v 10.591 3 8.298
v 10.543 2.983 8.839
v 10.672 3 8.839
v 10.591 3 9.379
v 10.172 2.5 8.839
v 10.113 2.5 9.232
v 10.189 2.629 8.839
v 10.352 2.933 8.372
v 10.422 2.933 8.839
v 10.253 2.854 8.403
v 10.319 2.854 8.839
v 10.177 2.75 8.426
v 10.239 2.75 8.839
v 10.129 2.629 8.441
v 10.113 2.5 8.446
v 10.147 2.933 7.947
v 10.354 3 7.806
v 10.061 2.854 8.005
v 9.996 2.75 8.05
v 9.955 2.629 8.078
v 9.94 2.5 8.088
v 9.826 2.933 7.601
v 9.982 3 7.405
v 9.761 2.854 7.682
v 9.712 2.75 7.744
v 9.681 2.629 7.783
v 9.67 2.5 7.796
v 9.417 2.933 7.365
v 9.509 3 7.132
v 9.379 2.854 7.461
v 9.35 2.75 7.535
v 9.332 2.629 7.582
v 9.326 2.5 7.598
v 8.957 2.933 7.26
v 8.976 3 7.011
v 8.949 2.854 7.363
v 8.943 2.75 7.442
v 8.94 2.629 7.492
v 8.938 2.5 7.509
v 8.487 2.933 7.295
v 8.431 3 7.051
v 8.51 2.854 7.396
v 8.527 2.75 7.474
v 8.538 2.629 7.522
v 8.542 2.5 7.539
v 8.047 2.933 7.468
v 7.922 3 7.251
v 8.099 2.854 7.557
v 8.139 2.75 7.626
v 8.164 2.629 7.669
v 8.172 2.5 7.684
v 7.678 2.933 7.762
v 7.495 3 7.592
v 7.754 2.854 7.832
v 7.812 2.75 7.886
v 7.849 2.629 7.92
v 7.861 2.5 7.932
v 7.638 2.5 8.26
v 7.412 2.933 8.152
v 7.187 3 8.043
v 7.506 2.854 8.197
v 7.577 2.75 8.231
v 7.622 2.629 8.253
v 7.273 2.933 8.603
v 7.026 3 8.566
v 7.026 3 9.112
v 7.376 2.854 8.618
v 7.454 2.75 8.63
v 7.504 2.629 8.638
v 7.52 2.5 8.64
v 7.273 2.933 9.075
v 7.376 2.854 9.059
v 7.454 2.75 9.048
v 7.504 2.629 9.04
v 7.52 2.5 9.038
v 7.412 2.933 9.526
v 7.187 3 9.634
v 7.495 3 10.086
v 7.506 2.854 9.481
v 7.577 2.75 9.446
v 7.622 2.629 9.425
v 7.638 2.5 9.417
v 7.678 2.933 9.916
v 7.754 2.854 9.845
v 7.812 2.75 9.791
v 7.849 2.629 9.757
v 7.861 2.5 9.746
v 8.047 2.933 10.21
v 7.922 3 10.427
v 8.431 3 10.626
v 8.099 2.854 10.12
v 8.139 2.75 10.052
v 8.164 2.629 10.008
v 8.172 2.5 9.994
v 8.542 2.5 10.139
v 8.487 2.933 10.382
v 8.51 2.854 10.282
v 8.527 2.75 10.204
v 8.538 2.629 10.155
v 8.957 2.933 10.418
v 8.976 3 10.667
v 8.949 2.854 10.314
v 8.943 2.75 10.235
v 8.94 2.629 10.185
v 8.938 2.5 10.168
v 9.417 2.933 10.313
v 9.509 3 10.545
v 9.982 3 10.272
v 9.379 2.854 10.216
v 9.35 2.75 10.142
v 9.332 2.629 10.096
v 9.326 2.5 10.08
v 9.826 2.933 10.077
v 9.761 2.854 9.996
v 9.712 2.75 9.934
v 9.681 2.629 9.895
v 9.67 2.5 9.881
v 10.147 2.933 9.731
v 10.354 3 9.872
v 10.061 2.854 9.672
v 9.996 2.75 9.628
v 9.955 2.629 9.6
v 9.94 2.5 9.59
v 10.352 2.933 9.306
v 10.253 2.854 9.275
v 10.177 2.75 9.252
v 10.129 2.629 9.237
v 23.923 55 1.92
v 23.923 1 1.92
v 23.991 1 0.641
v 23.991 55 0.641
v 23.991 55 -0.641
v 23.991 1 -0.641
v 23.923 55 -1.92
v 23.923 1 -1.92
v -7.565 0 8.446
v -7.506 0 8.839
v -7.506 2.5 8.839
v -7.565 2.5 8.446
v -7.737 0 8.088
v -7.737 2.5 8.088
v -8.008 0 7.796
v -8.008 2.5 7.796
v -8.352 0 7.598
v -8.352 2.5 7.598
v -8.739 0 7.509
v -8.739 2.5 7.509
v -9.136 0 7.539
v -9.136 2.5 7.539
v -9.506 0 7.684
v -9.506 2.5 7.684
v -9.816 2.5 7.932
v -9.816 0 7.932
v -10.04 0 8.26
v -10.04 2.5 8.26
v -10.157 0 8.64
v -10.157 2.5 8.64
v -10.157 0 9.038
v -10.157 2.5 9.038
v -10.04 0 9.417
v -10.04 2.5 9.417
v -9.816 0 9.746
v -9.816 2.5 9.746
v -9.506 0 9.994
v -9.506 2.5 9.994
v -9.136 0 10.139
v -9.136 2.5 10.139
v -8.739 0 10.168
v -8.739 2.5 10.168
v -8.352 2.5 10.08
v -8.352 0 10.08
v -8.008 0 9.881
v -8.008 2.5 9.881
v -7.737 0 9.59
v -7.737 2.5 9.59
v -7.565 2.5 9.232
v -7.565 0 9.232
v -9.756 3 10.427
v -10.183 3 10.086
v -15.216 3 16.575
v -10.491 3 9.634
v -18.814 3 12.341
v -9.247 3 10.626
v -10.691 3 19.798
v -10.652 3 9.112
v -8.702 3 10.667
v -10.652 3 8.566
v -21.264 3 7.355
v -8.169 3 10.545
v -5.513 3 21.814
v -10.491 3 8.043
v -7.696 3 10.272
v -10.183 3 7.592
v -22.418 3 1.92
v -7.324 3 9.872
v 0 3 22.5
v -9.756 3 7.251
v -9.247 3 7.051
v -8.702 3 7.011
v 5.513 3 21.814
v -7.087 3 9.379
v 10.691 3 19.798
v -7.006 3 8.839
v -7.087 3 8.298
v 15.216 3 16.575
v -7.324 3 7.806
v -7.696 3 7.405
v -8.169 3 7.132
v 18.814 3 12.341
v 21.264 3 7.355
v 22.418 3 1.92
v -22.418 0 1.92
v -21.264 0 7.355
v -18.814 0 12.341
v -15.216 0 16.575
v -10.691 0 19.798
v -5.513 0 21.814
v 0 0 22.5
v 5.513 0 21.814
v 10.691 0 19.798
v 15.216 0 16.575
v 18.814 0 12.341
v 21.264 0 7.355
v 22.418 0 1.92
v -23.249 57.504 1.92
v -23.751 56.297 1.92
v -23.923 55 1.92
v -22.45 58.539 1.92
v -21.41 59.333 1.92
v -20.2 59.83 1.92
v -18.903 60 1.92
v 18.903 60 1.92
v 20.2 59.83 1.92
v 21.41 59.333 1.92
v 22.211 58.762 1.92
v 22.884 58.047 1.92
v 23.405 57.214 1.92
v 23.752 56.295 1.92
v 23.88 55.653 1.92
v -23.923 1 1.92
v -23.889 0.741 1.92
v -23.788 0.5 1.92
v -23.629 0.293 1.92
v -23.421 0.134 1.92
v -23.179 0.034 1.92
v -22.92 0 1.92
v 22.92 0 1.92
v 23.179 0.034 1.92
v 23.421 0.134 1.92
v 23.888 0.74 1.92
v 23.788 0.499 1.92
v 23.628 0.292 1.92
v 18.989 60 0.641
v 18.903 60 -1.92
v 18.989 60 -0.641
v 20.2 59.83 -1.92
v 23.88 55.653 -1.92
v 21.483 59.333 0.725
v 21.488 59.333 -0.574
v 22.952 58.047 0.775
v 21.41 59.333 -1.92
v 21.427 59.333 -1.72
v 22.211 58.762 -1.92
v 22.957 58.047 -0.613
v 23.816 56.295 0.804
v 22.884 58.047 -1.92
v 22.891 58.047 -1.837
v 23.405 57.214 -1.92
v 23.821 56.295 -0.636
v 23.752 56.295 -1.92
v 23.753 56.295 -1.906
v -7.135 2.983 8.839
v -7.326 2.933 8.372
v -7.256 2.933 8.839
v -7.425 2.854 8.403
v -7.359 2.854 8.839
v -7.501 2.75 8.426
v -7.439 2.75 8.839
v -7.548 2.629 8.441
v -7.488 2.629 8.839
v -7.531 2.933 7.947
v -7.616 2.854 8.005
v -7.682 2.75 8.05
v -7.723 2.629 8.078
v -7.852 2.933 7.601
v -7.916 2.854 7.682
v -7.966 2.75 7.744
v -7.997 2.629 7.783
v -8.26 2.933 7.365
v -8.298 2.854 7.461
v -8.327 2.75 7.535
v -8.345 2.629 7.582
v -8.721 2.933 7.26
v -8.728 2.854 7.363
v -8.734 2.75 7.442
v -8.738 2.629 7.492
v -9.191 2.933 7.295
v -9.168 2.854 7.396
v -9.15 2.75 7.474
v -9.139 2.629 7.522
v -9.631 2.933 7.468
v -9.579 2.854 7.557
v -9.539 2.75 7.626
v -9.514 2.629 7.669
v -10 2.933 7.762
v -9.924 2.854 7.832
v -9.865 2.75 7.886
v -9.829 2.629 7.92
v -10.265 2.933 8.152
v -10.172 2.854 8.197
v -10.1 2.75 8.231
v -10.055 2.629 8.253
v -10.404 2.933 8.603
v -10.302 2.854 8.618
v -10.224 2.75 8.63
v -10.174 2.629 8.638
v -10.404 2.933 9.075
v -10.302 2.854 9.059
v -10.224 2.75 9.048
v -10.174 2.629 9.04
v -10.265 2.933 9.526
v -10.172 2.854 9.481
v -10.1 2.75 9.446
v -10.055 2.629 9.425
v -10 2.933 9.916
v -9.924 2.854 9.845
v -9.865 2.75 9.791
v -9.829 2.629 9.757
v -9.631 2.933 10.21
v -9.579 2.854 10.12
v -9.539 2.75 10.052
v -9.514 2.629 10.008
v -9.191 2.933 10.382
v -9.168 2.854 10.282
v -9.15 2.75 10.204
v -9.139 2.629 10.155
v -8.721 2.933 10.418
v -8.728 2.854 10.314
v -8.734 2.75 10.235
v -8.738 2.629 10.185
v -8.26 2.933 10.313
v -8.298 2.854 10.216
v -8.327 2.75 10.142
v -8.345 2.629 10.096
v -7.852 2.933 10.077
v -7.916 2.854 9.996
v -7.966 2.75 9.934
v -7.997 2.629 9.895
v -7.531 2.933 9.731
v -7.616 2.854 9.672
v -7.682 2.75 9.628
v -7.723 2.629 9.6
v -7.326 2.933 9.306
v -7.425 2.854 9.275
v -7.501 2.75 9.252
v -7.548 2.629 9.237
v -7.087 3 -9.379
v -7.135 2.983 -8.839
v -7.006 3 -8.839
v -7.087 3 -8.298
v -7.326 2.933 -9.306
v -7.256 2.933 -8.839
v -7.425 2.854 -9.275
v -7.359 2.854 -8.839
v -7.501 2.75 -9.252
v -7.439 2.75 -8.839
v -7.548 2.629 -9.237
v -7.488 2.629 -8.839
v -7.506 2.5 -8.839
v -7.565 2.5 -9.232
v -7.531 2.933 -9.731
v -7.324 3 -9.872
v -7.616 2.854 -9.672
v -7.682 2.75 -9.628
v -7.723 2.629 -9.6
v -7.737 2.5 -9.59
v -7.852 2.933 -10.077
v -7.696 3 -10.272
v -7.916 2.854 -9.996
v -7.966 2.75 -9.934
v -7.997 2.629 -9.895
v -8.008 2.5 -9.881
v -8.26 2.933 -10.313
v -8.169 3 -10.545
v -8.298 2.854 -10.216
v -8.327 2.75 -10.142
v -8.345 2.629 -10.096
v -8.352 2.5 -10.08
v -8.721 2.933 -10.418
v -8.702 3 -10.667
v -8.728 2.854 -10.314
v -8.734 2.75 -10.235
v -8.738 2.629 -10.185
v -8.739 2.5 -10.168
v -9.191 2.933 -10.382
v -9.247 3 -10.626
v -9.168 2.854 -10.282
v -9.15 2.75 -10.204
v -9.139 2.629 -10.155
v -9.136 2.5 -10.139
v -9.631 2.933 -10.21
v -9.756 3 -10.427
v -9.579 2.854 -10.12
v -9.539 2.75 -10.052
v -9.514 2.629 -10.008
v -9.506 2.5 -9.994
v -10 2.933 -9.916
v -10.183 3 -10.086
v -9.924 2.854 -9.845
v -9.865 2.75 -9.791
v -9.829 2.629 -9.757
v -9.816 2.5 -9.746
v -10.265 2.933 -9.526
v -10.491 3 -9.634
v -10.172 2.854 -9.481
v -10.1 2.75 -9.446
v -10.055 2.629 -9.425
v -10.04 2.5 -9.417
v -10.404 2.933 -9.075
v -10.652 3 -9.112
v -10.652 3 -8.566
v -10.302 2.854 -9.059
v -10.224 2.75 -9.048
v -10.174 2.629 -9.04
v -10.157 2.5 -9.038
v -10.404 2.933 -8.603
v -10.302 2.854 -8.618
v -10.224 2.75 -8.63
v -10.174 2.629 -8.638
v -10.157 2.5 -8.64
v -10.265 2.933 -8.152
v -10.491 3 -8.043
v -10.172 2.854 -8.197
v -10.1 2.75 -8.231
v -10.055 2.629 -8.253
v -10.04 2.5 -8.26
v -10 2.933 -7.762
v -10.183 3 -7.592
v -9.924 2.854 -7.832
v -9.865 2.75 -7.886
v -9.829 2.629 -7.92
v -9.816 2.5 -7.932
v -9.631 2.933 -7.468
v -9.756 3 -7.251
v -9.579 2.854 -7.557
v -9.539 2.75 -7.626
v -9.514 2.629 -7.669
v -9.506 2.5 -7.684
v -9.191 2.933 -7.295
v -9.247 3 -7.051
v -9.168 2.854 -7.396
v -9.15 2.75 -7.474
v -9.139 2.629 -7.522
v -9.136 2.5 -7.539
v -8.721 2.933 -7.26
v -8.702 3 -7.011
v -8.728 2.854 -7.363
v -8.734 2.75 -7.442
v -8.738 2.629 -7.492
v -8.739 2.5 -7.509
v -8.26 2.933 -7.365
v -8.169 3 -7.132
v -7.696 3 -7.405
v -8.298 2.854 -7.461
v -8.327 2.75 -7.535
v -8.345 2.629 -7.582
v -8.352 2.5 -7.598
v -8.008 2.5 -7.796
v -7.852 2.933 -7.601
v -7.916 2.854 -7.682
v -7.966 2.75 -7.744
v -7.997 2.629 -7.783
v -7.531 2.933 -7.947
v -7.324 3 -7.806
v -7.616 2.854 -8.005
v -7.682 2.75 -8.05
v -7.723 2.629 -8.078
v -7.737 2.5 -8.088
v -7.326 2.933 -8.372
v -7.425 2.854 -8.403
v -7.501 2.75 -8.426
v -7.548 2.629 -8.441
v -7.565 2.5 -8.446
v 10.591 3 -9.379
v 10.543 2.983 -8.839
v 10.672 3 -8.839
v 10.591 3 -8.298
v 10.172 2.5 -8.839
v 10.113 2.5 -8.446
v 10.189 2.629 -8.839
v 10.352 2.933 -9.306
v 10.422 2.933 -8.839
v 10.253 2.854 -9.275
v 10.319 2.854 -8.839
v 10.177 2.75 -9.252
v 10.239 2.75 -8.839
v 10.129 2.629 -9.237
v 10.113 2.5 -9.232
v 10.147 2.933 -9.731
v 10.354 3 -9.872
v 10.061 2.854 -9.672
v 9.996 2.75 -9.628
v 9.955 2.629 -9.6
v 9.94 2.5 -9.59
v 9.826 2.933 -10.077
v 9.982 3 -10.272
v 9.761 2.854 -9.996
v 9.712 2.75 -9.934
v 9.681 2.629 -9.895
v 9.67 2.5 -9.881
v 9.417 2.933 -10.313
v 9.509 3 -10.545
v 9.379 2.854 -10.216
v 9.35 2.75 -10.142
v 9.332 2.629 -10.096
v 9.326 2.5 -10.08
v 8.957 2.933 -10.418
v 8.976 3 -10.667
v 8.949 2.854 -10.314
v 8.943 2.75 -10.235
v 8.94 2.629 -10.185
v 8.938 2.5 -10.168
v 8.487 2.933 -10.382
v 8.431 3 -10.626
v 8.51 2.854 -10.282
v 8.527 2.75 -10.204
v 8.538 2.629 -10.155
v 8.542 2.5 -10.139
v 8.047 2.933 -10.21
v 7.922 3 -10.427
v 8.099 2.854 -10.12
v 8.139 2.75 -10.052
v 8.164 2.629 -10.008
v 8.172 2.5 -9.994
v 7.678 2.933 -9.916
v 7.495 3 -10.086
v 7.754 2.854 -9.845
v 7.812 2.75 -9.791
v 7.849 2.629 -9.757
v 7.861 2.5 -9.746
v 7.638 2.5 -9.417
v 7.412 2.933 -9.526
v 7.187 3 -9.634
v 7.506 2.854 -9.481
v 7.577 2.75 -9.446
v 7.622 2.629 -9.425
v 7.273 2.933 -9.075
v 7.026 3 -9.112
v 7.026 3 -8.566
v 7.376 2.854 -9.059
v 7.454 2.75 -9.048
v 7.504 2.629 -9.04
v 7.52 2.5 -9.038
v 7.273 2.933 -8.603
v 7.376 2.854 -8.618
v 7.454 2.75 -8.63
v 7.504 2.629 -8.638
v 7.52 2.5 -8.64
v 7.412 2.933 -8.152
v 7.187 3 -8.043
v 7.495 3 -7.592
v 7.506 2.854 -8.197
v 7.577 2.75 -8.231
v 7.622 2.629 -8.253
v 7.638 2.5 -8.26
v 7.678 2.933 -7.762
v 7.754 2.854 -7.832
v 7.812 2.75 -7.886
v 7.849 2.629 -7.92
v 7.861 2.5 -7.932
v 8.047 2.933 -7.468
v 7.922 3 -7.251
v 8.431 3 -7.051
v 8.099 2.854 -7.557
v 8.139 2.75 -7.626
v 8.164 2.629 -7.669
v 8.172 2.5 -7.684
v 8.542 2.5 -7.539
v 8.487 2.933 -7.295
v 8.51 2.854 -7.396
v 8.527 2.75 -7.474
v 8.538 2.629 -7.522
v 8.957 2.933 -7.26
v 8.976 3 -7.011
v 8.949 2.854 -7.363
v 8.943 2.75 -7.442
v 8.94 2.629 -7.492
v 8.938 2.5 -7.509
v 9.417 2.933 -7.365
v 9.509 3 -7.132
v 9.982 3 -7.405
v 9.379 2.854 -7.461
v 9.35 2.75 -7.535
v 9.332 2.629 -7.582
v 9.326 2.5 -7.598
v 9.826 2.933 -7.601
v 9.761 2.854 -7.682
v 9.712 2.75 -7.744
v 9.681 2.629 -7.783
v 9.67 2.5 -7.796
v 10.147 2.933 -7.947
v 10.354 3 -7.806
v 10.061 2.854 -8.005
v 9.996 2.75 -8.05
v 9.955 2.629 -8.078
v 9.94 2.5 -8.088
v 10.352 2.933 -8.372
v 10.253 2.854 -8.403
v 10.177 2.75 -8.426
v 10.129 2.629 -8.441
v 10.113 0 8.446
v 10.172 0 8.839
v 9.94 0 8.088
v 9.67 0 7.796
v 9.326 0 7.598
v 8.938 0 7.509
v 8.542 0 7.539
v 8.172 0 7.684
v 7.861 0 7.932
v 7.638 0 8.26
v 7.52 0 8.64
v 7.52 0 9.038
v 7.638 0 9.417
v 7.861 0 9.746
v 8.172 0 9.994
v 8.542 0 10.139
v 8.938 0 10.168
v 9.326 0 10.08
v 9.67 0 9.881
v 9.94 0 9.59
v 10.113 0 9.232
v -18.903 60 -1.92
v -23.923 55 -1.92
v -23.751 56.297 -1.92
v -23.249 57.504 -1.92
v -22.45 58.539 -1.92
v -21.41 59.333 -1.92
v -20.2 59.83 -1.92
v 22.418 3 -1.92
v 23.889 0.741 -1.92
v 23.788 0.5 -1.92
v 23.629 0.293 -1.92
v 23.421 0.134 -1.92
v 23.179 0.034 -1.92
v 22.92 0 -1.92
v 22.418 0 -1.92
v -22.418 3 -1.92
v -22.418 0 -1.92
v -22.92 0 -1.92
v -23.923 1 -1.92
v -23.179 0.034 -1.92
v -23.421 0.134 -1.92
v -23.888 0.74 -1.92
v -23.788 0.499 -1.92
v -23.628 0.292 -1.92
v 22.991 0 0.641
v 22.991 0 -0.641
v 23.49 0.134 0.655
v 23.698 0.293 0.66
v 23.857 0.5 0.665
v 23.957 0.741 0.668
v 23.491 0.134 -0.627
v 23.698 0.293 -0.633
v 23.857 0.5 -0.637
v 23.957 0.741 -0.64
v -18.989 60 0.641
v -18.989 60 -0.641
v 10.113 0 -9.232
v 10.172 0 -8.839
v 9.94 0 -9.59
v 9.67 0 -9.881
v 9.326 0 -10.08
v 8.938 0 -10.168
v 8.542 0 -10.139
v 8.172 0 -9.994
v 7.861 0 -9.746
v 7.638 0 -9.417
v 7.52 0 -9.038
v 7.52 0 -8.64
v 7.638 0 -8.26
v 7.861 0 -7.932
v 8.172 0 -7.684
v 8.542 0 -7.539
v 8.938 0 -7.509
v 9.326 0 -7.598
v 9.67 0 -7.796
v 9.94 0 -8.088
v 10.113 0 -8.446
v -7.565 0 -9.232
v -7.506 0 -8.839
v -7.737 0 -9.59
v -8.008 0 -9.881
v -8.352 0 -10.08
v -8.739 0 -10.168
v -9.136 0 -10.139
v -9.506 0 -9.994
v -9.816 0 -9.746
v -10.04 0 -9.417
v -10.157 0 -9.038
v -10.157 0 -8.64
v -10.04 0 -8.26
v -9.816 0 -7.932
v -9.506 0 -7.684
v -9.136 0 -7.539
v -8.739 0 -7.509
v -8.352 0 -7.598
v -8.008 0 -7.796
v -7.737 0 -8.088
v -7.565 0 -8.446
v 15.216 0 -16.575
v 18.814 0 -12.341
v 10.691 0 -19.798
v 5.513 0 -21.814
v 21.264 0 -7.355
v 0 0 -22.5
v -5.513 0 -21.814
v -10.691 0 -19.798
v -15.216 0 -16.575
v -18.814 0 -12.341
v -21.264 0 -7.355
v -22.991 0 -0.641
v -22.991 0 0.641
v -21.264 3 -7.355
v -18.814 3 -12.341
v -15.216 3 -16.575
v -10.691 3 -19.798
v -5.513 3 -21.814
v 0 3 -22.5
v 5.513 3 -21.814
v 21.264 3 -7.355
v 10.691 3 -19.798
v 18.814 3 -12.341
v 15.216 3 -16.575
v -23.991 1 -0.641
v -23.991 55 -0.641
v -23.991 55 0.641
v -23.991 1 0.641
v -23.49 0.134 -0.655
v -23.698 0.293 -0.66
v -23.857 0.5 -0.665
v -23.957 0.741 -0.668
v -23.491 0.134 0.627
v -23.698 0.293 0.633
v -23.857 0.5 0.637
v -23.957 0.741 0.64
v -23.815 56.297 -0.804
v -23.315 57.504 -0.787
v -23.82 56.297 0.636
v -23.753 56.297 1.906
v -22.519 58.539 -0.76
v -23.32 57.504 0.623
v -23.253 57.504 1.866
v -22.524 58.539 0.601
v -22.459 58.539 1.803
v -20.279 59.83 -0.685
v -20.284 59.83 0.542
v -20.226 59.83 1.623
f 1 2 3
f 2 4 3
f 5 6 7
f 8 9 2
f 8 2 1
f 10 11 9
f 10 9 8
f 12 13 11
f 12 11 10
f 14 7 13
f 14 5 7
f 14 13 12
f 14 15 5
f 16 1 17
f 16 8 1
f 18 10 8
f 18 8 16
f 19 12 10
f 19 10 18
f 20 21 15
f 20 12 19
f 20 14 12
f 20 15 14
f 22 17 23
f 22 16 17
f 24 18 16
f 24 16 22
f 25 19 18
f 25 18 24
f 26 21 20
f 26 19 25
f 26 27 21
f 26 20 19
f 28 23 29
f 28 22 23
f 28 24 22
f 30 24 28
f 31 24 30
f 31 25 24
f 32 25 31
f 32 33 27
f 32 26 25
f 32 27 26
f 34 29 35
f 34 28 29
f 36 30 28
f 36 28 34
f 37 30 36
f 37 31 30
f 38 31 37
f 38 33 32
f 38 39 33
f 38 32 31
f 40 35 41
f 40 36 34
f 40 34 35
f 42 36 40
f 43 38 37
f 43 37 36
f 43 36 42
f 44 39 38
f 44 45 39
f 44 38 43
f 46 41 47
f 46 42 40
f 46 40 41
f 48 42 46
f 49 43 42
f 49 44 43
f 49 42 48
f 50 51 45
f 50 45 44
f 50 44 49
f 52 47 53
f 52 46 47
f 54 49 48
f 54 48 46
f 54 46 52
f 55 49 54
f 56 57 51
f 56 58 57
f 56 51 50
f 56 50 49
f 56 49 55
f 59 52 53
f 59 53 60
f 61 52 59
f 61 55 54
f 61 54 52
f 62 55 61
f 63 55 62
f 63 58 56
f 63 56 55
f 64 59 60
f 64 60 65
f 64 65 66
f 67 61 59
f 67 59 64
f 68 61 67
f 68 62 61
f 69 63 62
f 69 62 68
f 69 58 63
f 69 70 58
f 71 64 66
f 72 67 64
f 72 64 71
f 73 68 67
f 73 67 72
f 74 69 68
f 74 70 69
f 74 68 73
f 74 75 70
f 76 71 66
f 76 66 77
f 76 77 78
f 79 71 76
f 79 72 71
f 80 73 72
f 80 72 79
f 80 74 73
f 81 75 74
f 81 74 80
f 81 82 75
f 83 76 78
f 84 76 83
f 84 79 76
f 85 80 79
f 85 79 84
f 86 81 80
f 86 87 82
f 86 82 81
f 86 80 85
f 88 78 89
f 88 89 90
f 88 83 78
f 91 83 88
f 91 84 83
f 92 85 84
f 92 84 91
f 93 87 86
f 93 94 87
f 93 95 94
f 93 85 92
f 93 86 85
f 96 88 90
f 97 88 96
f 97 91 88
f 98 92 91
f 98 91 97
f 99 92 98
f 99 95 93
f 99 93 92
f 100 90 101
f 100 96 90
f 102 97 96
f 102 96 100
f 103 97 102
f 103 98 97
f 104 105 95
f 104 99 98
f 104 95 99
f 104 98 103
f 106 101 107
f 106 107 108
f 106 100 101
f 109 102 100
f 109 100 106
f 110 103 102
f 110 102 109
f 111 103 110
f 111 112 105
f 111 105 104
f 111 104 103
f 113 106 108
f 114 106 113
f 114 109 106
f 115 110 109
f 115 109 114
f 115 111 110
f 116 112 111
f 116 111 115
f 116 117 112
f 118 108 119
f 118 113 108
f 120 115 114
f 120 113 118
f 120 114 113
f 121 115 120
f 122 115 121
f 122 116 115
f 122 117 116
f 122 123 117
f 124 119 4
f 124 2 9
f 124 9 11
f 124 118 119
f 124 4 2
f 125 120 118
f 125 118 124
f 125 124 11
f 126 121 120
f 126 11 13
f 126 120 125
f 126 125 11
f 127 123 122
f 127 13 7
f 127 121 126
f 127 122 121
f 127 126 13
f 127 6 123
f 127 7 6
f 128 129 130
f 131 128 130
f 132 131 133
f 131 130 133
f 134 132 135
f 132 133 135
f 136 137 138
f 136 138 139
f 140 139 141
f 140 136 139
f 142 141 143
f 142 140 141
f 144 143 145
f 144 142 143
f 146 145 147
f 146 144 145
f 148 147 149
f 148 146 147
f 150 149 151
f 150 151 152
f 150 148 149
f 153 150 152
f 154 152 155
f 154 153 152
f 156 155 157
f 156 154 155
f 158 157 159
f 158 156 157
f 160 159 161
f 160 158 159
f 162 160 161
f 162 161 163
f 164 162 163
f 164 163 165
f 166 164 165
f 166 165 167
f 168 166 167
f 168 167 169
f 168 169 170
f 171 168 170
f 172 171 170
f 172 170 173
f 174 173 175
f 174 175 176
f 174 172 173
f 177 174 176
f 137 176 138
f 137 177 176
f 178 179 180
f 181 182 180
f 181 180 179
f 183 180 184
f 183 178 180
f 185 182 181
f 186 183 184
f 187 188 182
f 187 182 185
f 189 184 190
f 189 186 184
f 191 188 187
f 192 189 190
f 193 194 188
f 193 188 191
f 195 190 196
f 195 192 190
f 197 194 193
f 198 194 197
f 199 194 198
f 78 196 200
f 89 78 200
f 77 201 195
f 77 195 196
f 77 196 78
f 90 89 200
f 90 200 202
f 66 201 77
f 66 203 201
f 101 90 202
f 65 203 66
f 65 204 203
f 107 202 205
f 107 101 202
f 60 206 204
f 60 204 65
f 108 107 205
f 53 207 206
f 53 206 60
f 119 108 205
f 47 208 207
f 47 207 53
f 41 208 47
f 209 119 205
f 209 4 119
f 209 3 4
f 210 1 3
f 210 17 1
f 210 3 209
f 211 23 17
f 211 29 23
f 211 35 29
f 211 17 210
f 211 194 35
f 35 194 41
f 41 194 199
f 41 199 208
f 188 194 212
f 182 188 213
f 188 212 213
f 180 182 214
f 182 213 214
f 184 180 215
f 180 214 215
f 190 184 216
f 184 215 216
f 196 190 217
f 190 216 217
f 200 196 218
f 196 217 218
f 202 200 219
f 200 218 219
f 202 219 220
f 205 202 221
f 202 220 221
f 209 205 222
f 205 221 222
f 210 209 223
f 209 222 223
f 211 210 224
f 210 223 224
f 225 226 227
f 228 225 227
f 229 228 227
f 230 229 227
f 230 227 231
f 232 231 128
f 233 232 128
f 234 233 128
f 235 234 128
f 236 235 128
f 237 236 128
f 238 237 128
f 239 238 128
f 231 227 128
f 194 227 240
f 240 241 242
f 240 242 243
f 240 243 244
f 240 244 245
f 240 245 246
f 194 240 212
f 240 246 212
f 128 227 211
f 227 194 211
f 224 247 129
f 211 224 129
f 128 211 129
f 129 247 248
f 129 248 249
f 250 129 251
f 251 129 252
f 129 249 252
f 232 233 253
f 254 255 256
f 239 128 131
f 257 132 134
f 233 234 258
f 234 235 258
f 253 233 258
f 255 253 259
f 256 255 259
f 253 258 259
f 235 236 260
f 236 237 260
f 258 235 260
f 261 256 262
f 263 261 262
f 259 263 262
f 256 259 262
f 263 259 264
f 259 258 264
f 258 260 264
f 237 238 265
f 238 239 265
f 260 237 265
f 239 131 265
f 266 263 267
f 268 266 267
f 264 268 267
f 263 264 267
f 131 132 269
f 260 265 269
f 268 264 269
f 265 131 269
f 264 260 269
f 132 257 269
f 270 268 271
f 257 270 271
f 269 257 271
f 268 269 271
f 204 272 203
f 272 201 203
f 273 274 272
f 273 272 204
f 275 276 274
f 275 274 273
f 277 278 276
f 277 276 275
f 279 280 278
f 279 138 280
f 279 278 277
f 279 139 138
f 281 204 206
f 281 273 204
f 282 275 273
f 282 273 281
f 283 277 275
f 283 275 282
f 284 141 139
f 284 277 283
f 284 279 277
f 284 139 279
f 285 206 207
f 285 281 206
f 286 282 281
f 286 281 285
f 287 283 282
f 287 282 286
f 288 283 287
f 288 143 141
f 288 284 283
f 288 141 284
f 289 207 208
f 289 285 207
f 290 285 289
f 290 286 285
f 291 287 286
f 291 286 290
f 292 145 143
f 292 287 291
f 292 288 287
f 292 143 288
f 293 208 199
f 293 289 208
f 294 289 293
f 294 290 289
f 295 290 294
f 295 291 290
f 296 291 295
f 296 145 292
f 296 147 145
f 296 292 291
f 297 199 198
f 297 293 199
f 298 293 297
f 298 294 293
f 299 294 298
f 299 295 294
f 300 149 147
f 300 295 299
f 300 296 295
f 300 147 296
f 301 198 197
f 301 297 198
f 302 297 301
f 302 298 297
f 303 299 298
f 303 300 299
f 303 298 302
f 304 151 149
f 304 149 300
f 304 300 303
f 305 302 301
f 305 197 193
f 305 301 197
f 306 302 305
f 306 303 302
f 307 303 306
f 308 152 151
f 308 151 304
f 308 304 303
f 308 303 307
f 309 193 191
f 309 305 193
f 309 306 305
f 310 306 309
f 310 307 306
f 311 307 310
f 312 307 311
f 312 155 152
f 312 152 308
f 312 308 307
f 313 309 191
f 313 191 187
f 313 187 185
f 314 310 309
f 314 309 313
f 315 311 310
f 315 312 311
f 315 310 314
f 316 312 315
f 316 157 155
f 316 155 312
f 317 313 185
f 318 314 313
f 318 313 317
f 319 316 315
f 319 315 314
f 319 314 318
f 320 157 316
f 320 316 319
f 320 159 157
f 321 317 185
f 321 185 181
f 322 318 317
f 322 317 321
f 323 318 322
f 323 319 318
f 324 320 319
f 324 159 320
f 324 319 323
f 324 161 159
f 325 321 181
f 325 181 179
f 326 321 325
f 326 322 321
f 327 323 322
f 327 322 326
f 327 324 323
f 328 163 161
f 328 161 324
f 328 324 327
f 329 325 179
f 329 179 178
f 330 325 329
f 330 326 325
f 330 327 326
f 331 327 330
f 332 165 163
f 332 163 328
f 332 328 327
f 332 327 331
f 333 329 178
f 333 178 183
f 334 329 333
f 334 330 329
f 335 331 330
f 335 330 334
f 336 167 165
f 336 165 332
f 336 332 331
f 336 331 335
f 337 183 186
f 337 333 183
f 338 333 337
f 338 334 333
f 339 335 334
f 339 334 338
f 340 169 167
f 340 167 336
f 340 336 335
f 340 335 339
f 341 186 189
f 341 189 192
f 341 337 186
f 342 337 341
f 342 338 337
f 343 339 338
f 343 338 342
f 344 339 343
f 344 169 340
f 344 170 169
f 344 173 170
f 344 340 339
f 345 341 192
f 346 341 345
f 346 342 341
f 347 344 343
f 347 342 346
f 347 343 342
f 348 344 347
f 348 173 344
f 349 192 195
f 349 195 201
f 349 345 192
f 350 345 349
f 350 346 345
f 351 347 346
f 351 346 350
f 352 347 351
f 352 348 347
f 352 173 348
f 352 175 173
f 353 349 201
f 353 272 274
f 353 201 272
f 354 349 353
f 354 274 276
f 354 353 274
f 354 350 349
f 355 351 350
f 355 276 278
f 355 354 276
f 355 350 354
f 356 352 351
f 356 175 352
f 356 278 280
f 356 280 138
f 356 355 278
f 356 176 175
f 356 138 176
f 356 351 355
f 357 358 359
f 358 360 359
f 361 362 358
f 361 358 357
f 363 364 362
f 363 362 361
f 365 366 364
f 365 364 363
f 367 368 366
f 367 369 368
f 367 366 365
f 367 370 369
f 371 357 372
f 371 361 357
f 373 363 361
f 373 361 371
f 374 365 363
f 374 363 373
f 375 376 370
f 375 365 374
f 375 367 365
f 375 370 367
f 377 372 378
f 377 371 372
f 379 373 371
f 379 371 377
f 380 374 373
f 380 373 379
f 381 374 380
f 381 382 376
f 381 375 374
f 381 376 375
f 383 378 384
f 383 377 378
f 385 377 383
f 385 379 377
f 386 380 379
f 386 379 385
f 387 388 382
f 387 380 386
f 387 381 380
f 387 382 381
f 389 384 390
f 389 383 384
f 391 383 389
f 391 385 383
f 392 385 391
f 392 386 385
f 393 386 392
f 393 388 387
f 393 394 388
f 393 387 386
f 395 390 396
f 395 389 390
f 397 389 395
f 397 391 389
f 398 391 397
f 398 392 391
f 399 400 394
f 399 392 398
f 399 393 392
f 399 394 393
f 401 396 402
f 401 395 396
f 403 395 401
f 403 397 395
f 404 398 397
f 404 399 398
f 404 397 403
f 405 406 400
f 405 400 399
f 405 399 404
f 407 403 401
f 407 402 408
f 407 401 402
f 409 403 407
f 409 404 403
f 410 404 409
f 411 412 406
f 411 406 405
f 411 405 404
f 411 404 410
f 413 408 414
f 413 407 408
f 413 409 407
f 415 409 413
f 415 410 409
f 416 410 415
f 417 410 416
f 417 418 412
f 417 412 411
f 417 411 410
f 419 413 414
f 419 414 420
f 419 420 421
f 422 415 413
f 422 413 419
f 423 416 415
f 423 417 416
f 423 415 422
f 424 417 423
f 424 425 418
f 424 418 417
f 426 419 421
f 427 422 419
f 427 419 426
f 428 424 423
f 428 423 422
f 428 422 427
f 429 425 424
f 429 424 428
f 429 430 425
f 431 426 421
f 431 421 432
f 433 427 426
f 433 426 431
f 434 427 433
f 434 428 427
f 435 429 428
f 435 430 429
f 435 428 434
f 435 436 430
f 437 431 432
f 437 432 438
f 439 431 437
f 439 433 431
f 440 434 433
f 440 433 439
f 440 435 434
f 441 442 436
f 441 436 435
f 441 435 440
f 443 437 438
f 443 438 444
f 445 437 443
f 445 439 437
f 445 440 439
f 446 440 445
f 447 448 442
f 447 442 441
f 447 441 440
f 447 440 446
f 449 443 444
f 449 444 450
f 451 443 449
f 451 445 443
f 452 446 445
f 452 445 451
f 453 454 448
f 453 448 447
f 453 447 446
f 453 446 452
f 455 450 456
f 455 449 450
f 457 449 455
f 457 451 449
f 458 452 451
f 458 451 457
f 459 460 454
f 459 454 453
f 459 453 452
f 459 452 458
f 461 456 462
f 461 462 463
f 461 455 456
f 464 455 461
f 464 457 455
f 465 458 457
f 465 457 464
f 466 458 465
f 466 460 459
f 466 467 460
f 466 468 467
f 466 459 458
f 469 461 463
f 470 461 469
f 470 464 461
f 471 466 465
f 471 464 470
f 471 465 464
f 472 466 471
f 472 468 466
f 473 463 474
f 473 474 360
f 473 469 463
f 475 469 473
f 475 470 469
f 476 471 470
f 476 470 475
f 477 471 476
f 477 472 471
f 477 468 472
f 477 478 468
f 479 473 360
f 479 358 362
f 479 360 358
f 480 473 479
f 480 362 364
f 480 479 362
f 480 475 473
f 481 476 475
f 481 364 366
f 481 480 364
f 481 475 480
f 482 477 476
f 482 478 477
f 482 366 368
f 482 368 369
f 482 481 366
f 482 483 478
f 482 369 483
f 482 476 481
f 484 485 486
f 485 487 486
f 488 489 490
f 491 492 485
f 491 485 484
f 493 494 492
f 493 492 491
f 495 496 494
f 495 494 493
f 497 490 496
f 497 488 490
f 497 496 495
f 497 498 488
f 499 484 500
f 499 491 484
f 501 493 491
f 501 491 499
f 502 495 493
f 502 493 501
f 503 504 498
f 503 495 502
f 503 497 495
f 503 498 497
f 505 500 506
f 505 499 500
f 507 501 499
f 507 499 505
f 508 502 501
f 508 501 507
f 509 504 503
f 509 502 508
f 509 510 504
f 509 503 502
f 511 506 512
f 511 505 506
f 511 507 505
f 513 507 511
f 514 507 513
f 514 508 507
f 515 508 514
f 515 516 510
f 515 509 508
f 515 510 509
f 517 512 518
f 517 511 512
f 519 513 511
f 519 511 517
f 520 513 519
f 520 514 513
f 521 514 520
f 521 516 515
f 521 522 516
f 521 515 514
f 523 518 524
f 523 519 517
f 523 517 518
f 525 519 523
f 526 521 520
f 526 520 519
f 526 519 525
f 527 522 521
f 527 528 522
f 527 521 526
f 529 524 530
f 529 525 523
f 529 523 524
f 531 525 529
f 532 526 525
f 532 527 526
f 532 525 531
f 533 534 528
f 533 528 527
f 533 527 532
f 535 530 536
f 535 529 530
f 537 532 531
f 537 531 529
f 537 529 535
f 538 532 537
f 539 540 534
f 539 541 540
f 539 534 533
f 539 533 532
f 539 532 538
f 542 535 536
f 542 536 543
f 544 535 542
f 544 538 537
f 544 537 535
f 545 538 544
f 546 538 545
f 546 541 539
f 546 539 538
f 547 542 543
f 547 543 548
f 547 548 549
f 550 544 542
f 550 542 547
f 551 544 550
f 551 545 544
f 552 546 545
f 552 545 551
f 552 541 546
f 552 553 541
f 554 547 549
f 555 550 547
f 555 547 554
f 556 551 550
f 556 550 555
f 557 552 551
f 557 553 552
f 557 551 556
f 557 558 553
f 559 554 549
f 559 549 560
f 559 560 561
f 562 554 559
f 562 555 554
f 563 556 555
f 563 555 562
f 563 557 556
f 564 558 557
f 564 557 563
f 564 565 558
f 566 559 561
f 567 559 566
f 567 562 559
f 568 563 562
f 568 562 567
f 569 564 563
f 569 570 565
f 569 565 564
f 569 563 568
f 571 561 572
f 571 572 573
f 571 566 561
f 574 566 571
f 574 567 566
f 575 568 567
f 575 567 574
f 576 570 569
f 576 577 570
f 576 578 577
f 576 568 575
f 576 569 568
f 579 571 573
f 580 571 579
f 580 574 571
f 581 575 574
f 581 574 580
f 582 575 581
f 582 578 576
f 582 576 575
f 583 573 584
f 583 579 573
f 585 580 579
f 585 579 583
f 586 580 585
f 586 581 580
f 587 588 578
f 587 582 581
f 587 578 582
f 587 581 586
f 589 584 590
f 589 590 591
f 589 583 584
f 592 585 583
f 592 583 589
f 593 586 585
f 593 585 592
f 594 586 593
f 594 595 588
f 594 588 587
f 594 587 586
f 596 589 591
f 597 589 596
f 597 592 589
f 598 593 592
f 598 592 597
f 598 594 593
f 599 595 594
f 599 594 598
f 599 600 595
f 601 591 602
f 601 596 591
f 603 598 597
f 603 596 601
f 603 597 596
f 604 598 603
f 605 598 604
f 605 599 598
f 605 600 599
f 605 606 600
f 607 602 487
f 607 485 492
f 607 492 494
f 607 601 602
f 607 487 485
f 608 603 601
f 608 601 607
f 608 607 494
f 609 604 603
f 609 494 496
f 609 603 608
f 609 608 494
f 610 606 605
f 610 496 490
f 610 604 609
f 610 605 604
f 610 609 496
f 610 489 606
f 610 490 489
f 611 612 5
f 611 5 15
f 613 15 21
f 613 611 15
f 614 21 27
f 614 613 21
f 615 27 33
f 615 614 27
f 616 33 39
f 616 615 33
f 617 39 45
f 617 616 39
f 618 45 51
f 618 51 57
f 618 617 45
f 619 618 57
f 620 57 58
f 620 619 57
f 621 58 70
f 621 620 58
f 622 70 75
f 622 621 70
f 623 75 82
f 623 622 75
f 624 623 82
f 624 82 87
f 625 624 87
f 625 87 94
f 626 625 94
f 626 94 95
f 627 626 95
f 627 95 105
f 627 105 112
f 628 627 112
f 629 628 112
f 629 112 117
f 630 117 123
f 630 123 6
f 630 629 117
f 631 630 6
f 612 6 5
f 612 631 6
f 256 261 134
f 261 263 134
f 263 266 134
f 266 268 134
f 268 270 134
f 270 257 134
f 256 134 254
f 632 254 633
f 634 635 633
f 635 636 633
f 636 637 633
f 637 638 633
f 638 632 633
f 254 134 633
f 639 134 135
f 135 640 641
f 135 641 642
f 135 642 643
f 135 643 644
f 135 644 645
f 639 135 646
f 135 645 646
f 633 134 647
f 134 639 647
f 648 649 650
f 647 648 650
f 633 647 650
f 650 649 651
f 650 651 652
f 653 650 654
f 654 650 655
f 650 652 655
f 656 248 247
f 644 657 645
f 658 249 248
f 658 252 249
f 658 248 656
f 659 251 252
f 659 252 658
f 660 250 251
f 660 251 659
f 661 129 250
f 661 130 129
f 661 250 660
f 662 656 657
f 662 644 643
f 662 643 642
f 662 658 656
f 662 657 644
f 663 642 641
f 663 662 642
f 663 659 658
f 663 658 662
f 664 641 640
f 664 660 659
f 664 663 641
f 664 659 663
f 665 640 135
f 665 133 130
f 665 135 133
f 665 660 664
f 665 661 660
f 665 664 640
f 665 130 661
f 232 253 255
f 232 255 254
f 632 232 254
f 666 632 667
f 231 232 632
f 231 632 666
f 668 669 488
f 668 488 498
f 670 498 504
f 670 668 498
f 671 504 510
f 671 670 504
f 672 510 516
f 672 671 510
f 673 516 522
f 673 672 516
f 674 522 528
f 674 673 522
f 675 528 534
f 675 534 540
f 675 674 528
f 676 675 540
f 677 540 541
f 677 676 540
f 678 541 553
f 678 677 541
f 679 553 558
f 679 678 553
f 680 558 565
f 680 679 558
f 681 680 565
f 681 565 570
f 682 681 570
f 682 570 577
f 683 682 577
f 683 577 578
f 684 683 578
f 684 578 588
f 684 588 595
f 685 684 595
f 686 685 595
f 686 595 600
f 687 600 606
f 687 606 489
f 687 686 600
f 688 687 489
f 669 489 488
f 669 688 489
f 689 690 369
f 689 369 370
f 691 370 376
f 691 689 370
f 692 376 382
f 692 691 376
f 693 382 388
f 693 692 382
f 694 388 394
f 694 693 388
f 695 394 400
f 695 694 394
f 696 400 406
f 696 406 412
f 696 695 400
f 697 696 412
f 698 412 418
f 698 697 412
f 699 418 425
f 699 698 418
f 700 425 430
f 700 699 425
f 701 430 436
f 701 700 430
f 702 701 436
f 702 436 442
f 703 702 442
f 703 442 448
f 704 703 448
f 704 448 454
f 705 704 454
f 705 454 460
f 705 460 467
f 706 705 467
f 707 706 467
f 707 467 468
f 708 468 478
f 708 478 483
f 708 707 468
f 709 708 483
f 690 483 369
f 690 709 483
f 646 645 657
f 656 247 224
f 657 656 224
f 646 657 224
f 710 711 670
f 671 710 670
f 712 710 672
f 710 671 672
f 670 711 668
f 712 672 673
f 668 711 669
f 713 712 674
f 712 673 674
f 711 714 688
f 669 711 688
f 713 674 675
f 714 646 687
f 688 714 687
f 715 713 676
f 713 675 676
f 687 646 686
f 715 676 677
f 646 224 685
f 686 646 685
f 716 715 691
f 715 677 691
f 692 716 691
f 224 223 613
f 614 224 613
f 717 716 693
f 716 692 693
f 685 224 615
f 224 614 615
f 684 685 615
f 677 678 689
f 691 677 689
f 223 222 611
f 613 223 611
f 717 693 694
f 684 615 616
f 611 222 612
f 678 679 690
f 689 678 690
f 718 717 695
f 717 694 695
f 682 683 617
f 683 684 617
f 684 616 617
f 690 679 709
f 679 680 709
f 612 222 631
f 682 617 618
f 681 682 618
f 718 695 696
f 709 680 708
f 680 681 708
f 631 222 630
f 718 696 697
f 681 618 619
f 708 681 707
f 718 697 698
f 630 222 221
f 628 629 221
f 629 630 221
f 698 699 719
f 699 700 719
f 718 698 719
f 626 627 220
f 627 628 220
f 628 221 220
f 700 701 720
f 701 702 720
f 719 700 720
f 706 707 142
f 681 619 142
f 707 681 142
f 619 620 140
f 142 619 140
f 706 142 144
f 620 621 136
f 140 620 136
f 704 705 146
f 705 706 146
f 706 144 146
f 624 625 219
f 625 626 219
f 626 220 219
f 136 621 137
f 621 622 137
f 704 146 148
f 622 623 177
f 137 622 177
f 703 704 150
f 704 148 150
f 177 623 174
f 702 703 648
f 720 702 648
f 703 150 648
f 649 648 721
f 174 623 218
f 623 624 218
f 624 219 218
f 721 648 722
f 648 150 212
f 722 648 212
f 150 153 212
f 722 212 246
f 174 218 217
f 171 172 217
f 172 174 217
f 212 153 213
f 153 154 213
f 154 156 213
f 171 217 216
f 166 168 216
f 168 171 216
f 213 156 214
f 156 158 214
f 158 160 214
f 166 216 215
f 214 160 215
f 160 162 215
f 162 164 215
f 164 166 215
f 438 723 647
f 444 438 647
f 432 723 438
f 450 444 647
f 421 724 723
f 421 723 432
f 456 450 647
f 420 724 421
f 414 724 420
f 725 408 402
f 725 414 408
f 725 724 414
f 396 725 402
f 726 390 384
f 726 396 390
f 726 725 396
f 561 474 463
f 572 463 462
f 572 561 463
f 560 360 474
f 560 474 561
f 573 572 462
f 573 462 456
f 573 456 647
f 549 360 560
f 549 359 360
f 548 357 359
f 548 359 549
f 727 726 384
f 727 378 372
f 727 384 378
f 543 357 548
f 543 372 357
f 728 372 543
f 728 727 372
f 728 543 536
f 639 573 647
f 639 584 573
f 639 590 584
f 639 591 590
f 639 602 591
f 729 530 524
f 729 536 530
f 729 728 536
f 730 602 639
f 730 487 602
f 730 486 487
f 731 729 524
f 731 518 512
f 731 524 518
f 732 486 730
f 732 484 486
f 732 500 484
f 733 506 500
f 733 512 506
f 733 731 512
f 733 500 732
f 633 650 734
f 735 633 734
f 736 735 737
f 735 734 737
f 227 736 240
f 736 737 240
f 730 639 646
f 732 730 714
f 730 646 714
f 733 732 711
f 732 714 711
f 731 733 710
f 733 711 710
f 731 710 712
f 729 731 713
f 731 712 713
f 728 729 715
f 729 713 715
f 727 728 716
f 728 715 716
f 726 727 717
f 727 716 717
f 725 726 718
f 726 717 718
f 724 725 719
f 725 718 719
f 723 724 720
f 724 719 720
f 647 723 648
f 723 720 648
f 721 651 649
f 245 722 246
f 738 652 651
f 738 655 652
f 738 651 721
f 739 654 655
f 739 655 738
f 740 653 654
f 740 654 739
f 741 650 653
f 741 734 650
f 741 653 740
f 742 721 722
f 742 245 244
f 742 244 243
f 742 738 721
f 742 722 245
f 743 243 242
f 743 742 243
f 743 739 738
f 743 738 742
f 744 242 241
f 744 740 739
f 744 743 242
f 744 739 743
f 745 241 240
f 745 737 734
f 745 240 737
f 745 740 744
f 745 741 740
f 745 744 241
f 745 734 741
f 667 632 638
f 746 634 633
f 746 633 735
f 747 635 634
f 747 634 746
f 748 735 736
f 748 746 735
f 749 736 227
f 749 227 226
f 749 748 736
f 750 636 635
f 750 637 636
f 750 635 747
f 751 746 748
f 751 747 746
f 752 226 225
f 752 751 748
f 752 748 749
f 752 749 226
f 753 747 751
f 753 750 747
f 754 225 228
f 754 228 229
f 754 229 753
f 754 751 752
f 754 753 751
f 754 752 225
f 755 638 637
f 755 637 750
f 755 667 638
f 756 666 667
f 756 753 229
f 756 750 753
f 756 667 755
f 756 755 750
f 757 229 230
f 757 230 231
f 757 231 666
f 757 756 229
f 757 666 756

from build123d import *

# Parameters (mm, degrees)
SKETCH_1_R      = 22.5
SKETCH_1_R_2    = 1.333333333
EXTRUDE_1_DEPTH = 3
EXTRUDE_2_DEPTH = 60
FILLET_1_R      = 0.5
FILLET_2_R      = 1
FILLET_3_R      = 5


with BuildPart() as part:
    # 草图1 → 凸台-拉伸1 (new body)
    with BuildSketch(Plane(origin=(0, 0, 0), x_dir=(1, 0, 0), z_dir=(0, 1, 0))):
        Circle(SKETCH_1_R)
        with Locations((8.838834765, 8.838834765)):
            Circle(SKETCH_1_R_2, mode=Mode.SUBTRACT)
        with Locations((8.838834765, -8.838834765)):
            Circle(SKETCH_1_R_2, mode=Mode.SUBTRACT)
        with Locations((-8.838834765, -8.838834765)):
            Circle(SKETCH_1_R_2, mode=Mode.SUBTRACT)
        with Locations((-8.838834765, 8.838834765)):
            Circle(SKETCH_1_R_2, mode=Mode.SUBTRACT)
    extrude(amount=EXTRUDE_1_DEPTH)

    # 草图3 → 凸台-拉伸2 (add)
    with BuildSketch(Plane.XZ):
        with BuildLine():
            Line((-23.923076725, 1.92), (23.923076725, 1.92))
            ThreePointArc((23.923076725, 1.92), (24, 0), (23.923076725, -1.92))
            Line((23.923076725, -1.92), (-23.923076725, -1.92))
            ThreePointArc((-23.923076725, -1.92), (-24, 0), (-23.923076725, 1.92))
        make_face()
    extrude(amount=-EXTRUDE_2_DEPTH)

    # 圆角1
    fillet_1_edges = [part.edges().sort_by_distance(p)[0] for p in [
        (-10.172168098, 3, 8.838834765),
        (-10.172168098, 3, -8.838834765),
        (7.505501431, 3, -8.838834765),
        (7.505501431, 3, 8.838834765),
    ]]
    fillet(fillet_1_edges, radius=FILLET_1_R)

    # 圆角2
    fillet_2_edges = [part.edges().sort_by_distance(p)[0] for p in [
        (24, 0, 0),
        (-24, 0, 0),
    ]]
    fillet(fillet_2_edges, radius=FILLET_2_R)

    # 圆角3
    fillet_3_edges = [part.edges().sort_by_distance(p)[0] for p in [
        (-24, 60, 0),
        (24, 60, 0),
    ]]
    fillet(fillet_3_edges, radius=FILLET_3_R)


solid = part.part
